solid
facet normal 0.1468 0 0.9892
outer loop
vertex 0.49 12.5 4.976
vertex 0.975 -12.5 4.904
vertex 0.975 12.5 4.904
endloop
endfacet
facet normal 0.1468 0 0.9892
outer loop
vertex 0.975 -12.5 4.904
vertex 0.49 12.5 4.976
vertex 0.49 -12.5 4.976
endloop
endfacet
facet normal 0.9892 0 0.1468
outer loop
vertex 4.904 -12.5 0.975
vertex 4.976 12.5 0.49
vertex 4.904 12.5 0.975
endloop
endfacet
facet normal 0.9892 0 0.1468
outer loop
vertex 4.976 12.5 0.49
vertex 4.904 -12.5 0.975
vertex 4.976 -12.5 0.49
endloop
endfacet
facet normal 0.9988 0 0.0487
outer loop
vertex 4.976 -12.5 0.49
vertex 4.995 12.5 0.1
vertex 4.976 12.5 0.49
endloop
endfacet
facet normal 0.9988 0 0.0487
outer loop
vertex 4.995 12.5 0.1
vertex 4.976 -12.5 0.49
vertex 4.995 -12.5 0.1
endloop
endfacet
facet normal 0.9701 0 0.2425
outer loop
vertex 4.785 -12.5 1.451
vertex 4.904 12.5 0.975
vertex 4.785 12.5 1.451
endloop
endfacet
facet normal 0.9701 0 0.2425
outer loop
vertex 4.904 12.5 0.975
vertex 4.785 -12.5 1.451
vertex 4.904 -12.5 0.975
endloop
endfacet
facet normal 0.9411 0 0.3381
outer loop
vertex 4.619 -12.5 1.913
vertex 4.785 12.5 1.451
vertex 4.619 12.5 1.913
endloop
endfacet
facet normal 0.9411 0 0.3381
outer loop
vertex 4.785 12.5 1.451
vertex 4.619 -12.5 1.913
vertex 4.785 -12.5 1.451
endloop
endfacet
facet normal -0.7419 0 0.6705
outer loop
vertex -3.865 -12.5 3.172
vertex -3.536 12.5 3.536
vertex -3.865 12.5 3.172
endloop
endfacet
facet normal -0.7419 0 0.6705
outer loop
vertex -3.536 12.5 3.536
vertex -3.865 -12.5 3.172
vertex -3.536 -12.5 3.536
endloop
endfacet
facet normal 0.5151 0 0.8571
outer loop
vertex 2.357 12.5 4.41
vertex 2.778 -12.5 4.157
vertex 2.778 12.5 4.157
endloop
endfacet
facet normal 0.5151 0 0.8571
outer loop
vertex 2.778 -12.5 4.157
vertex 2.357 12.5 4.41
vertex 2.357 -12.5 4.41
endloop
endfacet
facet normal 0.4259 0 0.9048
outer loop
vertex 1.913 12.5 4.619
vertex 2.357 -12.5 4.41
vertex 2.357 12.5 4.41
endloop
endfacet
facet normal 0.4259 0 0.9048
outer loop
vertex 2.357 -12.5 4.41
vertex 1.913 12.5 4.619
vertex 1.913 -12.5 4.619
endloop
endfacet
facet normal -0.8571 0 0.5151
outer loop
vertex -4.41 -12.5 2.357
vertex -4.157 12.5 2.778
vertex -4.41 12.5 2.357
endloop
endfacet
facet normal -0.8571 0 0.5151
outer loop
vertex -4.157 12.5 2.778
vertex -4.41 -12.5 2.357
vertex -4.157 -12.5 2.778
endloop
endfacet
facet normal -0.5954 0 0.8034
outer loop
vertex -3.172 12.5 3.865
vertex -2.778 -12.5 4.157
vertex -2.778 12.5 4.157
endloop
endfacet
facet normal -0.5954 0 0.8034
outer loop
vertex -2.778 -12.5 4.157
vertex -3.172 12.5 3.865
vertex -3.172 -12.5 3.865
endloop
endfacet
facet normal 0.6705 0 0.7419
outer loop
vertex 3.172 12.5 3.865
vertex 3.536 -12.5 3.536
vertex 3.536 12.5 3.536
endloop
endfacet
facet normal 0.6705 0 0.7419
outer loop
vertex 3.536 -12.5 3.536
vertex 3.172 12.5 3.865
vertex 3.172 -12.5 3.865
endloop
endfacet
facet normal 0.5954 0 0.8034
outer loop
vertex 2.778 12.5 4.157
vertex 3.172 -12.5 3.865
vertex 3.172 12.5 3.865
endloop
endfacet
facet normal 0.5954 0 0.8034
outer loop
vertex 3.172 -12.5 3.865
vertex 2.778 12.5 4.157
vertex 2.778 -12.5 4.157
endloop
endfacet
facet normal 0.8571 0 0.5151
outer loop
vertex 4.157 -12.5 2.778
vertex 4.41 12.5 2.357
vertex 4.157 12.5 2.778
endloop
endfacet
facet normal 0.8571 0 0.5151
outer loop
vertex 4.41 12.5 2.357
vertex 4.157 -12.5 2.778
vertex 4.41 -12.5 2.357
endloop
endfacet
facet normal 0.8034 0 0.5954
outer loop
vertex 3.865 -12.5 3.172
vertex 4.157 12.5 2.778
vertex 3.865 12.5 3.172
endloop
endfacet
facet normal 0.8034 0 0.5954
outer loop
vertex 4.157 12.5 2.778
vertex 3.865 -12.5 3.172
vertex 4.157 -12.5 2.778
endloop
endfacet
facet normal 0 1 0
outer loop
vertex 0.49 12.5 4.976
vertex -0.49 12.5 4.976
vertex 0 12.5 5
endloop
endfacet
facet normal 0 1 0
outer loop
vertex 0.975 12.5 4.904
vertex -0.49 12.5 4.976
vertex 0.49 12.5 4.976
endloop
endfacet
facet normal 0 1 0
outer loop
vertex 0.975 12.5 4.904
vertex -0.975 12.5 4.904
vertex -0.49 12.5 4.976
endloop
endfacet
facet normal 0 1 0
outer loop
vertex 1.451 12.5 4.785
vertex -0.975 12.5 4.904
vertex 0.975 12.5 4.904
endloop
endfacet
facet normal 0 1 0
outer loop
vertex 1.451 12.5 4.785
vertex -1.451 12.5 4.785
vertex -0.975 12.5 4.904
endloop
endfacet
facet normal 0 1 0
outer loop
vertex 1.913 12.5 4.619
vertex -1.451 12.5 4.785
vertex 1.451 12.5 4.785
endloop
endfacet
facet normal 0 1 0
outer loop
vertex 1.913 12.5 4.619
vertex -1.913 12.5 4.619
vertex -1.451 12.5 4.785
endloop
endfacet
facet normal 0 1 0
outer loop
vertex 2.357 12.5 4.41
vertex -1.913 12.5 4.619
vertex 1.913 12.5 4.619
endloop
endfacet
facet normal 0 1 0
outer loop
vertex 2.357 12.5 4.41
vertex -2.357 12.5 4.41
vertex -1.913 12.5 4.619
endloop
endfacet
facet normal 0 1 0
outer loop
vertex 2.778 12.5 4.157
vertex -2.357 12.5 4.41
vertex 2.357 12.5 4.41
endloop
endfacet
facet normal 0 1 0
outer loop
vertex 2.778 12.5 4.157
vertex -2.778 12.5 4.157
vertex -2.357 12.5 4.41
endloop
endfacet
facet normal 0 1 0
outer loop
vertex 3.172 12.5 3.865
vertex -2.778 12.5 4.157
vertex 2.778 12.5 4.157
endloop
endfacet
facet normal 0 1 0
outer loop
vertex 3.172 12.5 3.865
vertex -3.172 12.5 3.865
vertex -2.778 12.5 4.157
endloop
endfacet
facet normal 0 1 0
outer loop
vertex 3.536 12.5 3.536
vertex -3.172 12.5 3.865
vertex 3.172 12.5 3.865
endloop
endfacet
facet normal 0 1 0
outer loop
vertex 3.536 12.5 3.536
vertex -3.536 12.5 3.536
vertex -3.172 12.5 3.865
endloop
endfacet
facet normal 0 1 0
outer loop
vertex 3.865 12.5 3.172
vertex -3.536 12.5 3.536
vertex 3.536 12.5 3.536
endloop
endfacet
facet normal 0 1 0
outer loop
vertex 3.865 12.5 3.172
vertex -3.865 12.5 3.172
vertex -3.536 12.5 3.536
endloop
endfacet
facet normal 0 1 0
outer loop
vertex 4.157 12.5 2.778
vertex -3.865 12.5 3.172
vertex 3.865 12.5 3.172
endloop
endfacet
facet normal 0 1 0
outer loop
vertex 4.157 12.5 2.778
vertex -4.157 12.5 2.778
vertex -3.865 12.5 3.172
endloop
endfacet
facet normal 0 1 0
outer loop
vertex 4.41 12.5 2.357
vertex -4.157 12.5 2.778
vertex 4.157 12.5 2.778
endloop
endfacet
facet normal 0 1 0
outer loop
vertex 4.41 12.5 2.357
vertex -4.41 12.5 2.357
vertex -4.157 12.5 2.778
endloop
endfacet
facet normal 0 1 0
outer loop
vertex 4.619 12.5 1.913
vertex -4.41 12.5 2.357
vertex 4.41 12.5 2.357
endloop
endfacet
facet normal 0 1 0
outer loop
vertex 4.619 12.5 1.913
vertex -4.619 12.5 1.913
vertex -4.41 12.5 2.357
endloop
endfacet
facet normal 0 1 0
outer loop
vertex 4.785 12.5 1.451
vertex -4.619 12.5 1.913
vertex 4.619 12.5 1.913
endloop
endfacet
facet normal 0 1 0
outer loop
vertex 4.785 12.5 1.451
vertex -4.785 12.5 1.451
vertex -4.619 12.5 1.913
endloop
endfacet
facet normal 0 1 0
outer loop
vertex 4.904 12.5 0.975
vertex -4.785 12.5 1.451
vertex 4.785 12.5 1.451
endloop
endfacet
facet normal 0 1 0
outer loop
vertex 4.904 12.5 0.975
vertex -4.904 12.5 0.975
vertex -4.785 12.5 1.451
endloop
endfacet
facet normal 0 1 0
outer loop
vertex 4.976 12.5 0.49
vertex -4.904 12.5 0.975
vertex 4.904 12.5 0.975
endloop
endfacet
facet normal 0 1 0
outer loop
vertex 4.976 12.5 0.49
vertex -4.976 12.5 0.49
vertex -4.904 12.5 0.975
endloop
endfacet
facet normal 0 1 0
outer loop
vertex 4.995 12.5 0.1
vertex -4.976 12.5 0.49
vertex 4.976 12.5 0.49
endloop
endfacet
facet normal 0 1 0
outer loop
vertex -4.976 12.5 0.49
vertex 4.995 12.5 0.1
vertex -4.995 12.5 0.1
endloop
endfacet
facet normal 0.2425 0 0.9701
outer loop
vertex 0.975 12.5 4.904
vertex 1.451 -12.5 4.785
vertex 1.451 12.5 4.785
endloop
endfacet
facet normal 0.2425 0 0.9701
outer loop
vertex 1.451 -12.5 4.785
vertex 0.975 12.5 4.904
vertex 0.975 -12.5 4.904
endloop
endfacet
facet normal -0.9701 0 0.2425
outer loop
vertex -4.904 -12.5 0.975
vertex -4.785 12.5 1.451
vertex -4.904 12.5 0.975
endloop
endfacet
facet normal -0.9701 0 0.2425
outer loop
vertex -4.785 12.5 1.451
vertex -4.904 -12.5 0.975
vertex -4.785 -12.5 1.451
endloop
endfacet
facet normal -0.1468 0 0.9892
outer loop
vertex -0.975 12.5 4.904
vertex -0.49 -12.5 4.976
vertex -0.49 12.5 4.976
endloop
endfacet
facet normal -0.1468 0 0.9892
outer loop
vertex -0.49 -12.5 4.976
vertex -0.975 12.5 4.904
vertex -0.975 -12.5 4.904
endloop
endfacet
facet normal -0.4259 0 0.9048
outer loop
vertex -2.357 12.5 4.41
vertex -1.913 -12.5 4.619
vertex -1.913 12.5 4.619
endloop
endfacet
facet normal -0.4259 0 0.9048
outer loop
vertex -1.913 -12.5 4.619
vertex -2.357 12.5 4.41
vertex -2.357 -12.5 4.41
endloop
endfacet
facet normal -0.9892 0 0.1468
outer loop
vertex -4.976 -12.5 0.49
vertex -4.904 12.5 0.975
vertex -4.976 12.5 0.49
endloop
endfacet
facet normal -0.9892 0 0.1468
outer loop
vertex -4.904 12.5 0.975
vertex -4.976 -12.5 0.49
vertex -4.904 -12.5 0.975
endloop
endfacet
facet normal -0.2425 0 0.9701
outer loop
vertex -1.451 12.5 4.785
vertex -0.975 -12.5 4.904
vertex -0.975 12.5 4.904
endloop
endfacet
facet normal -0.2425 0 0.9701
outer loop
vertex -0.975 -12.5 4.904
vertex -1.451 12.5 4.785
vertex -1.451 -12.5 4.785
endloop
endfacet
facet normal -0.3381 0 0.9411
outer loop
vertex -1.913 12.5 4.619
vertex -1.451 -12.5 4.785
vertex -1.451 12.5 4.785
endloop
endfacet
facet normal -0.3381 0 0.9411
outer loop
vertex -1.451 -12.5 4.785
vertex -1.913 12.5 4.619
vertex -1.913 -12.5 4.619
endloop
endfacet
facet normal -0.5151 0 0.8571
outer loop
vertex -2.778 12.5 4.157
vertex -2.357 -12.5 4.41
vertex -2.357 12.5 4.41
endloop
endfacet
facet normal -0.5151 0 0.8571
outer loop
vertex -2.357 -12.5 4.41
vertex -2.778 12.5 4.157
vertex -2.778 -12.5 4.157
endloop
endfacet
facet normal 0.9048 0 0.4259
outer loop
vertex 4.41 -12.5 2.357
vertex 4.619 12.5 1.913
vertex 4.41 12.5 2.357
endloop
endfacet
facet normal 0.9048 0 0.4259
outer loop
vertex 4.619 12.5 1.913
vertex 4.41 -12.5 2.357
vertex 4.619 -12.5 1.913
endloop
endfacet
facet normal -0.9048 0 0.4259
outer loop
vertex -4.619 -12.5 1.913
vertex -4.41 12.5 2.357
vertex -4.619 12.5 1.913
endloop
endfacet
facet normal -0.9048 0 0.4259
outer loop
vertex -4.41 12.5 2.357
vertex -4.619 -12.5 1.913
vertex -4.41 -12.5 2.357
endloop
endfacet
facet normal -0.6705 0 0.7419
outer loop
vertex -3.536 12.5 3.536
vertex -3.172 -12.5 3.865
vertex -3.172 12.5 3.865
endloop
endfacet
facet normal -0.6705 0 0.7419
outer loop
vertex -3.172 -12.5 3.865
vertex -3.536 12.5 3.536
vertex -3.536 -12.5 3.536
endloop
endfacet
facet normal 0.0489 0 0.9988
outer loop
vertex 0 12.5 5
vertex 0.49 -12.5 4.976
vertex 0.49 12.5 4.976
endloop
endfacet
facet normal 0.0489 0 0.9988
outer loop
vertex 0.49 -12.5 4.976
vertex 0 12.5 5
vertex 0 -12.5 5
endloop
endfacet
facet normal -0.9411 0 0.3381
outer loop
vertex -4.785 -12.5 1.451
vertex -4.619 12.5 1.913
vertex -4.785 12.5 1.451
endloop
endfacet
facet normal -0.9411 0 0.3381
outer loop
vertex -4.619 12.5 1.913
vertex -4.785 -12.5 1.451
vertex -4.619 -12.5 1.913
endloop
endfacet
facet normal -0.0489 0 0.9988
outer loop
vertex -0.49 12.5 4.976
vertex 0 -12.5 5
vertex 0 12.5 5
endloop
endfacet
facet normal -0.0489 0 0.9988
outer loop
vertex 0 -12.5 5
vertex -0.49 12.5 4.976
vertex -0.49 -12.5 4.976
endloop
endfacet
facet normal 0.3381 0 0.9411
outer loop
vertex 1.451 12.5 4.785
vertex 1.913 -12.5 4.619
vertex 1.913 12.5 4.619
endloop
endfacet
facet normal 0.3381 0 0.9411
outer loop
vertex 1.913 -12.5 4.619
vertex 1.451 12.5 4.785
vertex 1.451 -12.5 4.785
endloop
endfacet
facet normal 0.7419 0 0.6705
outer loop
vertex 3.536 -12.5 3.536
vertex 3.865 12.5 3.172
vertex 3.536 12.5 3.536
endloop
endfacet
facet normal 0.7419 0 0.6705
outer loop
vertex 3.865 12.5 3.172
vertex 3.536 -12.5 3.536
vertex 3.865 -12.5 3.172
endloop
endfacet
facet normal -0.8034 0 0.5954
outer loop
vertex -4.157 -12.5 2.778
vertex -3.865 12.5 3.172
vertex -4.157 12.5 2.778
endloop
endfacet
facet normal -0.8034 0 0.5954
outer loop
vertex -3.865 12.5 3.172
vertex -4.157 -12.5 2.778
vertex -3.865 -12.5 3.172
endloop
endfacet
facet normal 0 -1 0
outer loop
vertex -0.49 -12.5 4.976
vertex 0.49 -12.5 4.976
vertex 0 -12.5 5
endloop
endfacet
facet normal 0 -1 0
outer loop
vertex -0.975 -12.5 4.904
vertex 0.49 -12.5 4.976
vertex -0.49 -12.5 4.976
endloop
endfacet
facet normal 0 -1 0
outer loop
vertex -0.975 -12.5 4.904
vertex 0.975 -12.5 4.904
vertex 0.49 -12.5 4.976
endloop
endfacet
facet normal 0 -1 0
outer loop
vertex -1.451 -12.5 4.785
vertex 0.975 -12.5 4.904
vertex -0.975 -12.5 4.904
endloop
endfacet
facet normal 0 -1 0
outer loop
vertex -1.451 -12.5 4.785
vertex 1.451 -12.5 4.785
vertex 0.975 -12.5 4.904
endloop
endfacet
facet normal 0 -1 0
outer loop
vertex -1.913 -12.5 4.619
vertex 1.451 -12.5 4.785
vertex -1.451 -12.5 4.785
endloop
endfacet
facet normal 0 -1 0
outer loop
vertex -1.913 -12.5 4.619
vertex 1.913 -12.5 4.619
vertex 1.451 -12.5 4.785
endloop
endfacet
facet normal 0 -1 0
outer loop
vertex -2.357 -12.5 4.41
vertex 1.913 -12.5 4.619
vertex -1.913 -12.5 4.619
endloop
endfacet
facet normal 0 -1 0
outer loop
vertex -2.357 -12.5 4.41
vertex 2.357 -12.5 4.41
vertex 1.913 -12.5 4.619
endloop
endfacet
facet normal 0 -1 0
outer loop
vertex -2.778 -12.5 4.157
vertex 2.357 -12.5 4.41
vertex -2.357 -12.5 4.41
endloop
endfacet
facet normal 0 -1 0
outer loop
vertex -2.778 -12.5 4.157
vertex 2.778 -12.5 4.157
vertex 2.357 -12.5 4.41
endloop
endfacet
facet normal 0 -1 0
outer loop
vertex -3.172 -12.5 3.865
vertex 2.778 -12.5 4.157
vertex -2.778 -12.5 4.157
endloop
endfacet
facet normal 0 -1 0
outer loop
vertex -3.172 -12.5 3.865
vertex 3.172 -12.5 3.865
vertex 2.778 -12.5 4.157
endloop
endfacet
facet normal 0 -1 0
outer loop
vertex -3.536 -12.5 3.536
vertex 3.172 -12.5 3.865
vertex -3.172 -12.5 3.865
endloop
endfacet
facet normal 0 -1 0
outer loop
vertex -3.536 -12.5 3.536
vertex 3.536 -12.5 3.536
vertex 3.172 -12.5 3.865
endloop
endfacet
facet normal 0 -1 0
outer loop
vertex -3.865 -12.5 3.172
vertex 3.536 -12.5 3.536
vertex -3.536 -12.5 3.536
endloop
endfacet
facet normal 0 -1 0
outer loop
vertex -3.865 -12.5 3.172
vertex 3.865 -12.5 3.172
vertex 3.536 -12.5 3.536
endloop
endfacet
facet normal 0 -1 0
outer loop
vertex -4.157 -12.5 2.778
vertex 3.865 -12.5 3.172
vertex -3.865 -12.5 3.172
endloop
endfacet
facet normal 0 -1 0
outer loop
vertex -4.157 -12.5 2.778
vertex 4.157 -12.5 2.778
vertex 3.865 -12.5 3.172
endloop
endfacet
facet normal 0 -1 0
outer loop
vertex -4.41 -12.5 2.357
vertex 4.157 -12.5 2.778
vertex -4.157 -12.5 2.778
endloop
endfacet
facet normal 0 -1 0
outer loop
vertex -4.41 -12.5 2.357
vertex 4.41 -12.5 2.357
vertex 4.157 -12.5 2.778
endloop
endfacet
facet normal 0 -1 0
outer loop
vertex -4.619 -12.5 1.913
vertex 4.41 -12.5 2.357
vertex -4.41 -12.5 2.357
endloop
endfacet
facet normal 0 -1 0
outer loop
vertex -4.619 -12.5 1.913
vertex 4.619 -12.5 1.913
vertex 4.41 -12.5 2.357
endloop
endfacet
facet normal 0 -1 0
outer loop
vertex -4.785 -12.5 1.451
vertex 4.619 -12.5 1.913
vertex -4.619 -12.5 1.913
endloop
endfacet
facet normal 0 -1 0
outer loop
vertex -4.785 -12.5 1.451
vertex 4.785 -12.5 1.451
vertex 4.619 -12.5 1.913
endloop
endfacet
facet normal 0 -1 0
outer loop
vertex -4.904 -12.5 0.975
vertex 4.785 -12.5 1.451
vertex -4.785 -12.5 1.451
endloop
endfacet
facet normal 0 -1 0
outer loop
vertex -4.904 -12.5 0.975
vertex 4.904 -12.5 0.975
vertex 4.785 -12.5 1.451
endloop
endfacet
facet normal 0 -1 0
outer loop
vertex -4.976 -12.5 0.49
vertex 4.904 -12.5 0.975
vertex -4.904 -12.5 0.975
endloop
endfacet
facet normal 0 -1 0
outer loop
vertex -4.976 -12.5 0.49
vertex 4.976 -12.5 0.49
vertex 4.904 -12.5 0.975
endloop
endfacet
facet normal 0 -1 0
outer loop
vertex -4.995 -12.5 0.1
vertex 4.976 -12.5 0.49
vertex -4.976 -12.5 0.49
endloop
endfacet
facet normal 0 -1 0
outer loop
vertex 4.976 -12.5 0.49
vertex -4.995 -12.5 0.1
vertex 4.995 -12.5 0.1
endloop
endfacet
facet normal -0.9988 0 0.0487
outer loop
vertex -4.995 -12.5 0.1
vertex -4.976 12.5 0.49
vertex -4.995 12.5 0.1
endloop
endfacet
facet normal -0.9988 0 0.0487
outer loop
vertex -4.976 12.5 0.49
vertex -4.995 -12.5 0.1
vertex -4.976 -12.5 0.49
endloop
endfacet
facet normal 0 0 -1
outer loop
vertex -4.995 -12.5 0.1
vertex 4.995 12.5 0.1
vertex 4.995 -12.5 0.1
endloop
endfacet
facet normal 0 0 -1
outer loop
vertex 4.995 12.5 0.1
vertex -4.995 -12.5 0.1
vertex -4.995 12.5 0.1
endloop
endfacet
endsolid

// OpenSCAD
// Woodruff Key Dimensions
woodruff_key_diameter = 10; // Diameter of the half-cylinder (width of the key)
woodruff_key_length = 25;   // Length of the key along its axis

// Global rendering parameters
$fn = 64; // Number of facets for circular shapes, higher value means smoother curves

module woodruff_key(diameter, length) {
    // The Woodruff key is a half-cylinder.
    // We create a full cylinder, then cut off the bottom half.
    difference() {
        // 1. Create a full cylinder
        // The cylinder is initially along the Z-axis.
        // We want its length along the Y-axis and its flat side on the bottom (Z=0).
        // So, rotate it 90 degrees around the X-axis.
        // Using center=true for the cylinder places its center at [0,0,0].
        // After rotation, its axis is along the Y-axis, and it extends from
        // Z = -diameter/2 to Z = diameter/2.
        rotate([90, 0, 0])
        cylinder(h = length, r = diameter / 2, center = true);

        // 2. Cut off the bottom half
        // To get the flat side on the bottom (Z=0) and curved side on top,
        // we need to remove everything where Z < 0.
        // Create a cutting cube that covers the negative Z-space of the cylinder.
        // The cube needs to be slightly larger than the cylinder in X and Y
        // to ensure a clean cut.
        cube_width = diameter * 1.1;  // Slightly wider than the cylinder
        cube_length = length * 1.1;   // Slightly longer than the cylinder
        
        // The cylinder extends from Z = -diameter/2 to Z = diameter/2.
        // We want to remove the part from Z = -diameter/2 up to Z = 0.
        // The cutting cube's bottom should be below -diameter/2, and its top should be at or above 0.
        // We use center=false for the cube to define its starting corner.
        translate([
            -cube_width / 2,         // X-start: centered on X-axis
            -cube_length / 2,        // Y-start: centered on Y-axis
            -(diameter / 2 + 0.1)    // Z-start: slightly below the cylinder's lowest point
        ])
        cube(size = [
            cube_width,              // X-dimension
            cube_length,             // Y-dimension
            diameter / 2 + 0.2       // Z-dimension: from Z-start up to slightly above Z=0
        ]);
    }
}

// Render the Woodruff key
woodruff_key(woodruff_key_diameter, woodruff_key_length);
